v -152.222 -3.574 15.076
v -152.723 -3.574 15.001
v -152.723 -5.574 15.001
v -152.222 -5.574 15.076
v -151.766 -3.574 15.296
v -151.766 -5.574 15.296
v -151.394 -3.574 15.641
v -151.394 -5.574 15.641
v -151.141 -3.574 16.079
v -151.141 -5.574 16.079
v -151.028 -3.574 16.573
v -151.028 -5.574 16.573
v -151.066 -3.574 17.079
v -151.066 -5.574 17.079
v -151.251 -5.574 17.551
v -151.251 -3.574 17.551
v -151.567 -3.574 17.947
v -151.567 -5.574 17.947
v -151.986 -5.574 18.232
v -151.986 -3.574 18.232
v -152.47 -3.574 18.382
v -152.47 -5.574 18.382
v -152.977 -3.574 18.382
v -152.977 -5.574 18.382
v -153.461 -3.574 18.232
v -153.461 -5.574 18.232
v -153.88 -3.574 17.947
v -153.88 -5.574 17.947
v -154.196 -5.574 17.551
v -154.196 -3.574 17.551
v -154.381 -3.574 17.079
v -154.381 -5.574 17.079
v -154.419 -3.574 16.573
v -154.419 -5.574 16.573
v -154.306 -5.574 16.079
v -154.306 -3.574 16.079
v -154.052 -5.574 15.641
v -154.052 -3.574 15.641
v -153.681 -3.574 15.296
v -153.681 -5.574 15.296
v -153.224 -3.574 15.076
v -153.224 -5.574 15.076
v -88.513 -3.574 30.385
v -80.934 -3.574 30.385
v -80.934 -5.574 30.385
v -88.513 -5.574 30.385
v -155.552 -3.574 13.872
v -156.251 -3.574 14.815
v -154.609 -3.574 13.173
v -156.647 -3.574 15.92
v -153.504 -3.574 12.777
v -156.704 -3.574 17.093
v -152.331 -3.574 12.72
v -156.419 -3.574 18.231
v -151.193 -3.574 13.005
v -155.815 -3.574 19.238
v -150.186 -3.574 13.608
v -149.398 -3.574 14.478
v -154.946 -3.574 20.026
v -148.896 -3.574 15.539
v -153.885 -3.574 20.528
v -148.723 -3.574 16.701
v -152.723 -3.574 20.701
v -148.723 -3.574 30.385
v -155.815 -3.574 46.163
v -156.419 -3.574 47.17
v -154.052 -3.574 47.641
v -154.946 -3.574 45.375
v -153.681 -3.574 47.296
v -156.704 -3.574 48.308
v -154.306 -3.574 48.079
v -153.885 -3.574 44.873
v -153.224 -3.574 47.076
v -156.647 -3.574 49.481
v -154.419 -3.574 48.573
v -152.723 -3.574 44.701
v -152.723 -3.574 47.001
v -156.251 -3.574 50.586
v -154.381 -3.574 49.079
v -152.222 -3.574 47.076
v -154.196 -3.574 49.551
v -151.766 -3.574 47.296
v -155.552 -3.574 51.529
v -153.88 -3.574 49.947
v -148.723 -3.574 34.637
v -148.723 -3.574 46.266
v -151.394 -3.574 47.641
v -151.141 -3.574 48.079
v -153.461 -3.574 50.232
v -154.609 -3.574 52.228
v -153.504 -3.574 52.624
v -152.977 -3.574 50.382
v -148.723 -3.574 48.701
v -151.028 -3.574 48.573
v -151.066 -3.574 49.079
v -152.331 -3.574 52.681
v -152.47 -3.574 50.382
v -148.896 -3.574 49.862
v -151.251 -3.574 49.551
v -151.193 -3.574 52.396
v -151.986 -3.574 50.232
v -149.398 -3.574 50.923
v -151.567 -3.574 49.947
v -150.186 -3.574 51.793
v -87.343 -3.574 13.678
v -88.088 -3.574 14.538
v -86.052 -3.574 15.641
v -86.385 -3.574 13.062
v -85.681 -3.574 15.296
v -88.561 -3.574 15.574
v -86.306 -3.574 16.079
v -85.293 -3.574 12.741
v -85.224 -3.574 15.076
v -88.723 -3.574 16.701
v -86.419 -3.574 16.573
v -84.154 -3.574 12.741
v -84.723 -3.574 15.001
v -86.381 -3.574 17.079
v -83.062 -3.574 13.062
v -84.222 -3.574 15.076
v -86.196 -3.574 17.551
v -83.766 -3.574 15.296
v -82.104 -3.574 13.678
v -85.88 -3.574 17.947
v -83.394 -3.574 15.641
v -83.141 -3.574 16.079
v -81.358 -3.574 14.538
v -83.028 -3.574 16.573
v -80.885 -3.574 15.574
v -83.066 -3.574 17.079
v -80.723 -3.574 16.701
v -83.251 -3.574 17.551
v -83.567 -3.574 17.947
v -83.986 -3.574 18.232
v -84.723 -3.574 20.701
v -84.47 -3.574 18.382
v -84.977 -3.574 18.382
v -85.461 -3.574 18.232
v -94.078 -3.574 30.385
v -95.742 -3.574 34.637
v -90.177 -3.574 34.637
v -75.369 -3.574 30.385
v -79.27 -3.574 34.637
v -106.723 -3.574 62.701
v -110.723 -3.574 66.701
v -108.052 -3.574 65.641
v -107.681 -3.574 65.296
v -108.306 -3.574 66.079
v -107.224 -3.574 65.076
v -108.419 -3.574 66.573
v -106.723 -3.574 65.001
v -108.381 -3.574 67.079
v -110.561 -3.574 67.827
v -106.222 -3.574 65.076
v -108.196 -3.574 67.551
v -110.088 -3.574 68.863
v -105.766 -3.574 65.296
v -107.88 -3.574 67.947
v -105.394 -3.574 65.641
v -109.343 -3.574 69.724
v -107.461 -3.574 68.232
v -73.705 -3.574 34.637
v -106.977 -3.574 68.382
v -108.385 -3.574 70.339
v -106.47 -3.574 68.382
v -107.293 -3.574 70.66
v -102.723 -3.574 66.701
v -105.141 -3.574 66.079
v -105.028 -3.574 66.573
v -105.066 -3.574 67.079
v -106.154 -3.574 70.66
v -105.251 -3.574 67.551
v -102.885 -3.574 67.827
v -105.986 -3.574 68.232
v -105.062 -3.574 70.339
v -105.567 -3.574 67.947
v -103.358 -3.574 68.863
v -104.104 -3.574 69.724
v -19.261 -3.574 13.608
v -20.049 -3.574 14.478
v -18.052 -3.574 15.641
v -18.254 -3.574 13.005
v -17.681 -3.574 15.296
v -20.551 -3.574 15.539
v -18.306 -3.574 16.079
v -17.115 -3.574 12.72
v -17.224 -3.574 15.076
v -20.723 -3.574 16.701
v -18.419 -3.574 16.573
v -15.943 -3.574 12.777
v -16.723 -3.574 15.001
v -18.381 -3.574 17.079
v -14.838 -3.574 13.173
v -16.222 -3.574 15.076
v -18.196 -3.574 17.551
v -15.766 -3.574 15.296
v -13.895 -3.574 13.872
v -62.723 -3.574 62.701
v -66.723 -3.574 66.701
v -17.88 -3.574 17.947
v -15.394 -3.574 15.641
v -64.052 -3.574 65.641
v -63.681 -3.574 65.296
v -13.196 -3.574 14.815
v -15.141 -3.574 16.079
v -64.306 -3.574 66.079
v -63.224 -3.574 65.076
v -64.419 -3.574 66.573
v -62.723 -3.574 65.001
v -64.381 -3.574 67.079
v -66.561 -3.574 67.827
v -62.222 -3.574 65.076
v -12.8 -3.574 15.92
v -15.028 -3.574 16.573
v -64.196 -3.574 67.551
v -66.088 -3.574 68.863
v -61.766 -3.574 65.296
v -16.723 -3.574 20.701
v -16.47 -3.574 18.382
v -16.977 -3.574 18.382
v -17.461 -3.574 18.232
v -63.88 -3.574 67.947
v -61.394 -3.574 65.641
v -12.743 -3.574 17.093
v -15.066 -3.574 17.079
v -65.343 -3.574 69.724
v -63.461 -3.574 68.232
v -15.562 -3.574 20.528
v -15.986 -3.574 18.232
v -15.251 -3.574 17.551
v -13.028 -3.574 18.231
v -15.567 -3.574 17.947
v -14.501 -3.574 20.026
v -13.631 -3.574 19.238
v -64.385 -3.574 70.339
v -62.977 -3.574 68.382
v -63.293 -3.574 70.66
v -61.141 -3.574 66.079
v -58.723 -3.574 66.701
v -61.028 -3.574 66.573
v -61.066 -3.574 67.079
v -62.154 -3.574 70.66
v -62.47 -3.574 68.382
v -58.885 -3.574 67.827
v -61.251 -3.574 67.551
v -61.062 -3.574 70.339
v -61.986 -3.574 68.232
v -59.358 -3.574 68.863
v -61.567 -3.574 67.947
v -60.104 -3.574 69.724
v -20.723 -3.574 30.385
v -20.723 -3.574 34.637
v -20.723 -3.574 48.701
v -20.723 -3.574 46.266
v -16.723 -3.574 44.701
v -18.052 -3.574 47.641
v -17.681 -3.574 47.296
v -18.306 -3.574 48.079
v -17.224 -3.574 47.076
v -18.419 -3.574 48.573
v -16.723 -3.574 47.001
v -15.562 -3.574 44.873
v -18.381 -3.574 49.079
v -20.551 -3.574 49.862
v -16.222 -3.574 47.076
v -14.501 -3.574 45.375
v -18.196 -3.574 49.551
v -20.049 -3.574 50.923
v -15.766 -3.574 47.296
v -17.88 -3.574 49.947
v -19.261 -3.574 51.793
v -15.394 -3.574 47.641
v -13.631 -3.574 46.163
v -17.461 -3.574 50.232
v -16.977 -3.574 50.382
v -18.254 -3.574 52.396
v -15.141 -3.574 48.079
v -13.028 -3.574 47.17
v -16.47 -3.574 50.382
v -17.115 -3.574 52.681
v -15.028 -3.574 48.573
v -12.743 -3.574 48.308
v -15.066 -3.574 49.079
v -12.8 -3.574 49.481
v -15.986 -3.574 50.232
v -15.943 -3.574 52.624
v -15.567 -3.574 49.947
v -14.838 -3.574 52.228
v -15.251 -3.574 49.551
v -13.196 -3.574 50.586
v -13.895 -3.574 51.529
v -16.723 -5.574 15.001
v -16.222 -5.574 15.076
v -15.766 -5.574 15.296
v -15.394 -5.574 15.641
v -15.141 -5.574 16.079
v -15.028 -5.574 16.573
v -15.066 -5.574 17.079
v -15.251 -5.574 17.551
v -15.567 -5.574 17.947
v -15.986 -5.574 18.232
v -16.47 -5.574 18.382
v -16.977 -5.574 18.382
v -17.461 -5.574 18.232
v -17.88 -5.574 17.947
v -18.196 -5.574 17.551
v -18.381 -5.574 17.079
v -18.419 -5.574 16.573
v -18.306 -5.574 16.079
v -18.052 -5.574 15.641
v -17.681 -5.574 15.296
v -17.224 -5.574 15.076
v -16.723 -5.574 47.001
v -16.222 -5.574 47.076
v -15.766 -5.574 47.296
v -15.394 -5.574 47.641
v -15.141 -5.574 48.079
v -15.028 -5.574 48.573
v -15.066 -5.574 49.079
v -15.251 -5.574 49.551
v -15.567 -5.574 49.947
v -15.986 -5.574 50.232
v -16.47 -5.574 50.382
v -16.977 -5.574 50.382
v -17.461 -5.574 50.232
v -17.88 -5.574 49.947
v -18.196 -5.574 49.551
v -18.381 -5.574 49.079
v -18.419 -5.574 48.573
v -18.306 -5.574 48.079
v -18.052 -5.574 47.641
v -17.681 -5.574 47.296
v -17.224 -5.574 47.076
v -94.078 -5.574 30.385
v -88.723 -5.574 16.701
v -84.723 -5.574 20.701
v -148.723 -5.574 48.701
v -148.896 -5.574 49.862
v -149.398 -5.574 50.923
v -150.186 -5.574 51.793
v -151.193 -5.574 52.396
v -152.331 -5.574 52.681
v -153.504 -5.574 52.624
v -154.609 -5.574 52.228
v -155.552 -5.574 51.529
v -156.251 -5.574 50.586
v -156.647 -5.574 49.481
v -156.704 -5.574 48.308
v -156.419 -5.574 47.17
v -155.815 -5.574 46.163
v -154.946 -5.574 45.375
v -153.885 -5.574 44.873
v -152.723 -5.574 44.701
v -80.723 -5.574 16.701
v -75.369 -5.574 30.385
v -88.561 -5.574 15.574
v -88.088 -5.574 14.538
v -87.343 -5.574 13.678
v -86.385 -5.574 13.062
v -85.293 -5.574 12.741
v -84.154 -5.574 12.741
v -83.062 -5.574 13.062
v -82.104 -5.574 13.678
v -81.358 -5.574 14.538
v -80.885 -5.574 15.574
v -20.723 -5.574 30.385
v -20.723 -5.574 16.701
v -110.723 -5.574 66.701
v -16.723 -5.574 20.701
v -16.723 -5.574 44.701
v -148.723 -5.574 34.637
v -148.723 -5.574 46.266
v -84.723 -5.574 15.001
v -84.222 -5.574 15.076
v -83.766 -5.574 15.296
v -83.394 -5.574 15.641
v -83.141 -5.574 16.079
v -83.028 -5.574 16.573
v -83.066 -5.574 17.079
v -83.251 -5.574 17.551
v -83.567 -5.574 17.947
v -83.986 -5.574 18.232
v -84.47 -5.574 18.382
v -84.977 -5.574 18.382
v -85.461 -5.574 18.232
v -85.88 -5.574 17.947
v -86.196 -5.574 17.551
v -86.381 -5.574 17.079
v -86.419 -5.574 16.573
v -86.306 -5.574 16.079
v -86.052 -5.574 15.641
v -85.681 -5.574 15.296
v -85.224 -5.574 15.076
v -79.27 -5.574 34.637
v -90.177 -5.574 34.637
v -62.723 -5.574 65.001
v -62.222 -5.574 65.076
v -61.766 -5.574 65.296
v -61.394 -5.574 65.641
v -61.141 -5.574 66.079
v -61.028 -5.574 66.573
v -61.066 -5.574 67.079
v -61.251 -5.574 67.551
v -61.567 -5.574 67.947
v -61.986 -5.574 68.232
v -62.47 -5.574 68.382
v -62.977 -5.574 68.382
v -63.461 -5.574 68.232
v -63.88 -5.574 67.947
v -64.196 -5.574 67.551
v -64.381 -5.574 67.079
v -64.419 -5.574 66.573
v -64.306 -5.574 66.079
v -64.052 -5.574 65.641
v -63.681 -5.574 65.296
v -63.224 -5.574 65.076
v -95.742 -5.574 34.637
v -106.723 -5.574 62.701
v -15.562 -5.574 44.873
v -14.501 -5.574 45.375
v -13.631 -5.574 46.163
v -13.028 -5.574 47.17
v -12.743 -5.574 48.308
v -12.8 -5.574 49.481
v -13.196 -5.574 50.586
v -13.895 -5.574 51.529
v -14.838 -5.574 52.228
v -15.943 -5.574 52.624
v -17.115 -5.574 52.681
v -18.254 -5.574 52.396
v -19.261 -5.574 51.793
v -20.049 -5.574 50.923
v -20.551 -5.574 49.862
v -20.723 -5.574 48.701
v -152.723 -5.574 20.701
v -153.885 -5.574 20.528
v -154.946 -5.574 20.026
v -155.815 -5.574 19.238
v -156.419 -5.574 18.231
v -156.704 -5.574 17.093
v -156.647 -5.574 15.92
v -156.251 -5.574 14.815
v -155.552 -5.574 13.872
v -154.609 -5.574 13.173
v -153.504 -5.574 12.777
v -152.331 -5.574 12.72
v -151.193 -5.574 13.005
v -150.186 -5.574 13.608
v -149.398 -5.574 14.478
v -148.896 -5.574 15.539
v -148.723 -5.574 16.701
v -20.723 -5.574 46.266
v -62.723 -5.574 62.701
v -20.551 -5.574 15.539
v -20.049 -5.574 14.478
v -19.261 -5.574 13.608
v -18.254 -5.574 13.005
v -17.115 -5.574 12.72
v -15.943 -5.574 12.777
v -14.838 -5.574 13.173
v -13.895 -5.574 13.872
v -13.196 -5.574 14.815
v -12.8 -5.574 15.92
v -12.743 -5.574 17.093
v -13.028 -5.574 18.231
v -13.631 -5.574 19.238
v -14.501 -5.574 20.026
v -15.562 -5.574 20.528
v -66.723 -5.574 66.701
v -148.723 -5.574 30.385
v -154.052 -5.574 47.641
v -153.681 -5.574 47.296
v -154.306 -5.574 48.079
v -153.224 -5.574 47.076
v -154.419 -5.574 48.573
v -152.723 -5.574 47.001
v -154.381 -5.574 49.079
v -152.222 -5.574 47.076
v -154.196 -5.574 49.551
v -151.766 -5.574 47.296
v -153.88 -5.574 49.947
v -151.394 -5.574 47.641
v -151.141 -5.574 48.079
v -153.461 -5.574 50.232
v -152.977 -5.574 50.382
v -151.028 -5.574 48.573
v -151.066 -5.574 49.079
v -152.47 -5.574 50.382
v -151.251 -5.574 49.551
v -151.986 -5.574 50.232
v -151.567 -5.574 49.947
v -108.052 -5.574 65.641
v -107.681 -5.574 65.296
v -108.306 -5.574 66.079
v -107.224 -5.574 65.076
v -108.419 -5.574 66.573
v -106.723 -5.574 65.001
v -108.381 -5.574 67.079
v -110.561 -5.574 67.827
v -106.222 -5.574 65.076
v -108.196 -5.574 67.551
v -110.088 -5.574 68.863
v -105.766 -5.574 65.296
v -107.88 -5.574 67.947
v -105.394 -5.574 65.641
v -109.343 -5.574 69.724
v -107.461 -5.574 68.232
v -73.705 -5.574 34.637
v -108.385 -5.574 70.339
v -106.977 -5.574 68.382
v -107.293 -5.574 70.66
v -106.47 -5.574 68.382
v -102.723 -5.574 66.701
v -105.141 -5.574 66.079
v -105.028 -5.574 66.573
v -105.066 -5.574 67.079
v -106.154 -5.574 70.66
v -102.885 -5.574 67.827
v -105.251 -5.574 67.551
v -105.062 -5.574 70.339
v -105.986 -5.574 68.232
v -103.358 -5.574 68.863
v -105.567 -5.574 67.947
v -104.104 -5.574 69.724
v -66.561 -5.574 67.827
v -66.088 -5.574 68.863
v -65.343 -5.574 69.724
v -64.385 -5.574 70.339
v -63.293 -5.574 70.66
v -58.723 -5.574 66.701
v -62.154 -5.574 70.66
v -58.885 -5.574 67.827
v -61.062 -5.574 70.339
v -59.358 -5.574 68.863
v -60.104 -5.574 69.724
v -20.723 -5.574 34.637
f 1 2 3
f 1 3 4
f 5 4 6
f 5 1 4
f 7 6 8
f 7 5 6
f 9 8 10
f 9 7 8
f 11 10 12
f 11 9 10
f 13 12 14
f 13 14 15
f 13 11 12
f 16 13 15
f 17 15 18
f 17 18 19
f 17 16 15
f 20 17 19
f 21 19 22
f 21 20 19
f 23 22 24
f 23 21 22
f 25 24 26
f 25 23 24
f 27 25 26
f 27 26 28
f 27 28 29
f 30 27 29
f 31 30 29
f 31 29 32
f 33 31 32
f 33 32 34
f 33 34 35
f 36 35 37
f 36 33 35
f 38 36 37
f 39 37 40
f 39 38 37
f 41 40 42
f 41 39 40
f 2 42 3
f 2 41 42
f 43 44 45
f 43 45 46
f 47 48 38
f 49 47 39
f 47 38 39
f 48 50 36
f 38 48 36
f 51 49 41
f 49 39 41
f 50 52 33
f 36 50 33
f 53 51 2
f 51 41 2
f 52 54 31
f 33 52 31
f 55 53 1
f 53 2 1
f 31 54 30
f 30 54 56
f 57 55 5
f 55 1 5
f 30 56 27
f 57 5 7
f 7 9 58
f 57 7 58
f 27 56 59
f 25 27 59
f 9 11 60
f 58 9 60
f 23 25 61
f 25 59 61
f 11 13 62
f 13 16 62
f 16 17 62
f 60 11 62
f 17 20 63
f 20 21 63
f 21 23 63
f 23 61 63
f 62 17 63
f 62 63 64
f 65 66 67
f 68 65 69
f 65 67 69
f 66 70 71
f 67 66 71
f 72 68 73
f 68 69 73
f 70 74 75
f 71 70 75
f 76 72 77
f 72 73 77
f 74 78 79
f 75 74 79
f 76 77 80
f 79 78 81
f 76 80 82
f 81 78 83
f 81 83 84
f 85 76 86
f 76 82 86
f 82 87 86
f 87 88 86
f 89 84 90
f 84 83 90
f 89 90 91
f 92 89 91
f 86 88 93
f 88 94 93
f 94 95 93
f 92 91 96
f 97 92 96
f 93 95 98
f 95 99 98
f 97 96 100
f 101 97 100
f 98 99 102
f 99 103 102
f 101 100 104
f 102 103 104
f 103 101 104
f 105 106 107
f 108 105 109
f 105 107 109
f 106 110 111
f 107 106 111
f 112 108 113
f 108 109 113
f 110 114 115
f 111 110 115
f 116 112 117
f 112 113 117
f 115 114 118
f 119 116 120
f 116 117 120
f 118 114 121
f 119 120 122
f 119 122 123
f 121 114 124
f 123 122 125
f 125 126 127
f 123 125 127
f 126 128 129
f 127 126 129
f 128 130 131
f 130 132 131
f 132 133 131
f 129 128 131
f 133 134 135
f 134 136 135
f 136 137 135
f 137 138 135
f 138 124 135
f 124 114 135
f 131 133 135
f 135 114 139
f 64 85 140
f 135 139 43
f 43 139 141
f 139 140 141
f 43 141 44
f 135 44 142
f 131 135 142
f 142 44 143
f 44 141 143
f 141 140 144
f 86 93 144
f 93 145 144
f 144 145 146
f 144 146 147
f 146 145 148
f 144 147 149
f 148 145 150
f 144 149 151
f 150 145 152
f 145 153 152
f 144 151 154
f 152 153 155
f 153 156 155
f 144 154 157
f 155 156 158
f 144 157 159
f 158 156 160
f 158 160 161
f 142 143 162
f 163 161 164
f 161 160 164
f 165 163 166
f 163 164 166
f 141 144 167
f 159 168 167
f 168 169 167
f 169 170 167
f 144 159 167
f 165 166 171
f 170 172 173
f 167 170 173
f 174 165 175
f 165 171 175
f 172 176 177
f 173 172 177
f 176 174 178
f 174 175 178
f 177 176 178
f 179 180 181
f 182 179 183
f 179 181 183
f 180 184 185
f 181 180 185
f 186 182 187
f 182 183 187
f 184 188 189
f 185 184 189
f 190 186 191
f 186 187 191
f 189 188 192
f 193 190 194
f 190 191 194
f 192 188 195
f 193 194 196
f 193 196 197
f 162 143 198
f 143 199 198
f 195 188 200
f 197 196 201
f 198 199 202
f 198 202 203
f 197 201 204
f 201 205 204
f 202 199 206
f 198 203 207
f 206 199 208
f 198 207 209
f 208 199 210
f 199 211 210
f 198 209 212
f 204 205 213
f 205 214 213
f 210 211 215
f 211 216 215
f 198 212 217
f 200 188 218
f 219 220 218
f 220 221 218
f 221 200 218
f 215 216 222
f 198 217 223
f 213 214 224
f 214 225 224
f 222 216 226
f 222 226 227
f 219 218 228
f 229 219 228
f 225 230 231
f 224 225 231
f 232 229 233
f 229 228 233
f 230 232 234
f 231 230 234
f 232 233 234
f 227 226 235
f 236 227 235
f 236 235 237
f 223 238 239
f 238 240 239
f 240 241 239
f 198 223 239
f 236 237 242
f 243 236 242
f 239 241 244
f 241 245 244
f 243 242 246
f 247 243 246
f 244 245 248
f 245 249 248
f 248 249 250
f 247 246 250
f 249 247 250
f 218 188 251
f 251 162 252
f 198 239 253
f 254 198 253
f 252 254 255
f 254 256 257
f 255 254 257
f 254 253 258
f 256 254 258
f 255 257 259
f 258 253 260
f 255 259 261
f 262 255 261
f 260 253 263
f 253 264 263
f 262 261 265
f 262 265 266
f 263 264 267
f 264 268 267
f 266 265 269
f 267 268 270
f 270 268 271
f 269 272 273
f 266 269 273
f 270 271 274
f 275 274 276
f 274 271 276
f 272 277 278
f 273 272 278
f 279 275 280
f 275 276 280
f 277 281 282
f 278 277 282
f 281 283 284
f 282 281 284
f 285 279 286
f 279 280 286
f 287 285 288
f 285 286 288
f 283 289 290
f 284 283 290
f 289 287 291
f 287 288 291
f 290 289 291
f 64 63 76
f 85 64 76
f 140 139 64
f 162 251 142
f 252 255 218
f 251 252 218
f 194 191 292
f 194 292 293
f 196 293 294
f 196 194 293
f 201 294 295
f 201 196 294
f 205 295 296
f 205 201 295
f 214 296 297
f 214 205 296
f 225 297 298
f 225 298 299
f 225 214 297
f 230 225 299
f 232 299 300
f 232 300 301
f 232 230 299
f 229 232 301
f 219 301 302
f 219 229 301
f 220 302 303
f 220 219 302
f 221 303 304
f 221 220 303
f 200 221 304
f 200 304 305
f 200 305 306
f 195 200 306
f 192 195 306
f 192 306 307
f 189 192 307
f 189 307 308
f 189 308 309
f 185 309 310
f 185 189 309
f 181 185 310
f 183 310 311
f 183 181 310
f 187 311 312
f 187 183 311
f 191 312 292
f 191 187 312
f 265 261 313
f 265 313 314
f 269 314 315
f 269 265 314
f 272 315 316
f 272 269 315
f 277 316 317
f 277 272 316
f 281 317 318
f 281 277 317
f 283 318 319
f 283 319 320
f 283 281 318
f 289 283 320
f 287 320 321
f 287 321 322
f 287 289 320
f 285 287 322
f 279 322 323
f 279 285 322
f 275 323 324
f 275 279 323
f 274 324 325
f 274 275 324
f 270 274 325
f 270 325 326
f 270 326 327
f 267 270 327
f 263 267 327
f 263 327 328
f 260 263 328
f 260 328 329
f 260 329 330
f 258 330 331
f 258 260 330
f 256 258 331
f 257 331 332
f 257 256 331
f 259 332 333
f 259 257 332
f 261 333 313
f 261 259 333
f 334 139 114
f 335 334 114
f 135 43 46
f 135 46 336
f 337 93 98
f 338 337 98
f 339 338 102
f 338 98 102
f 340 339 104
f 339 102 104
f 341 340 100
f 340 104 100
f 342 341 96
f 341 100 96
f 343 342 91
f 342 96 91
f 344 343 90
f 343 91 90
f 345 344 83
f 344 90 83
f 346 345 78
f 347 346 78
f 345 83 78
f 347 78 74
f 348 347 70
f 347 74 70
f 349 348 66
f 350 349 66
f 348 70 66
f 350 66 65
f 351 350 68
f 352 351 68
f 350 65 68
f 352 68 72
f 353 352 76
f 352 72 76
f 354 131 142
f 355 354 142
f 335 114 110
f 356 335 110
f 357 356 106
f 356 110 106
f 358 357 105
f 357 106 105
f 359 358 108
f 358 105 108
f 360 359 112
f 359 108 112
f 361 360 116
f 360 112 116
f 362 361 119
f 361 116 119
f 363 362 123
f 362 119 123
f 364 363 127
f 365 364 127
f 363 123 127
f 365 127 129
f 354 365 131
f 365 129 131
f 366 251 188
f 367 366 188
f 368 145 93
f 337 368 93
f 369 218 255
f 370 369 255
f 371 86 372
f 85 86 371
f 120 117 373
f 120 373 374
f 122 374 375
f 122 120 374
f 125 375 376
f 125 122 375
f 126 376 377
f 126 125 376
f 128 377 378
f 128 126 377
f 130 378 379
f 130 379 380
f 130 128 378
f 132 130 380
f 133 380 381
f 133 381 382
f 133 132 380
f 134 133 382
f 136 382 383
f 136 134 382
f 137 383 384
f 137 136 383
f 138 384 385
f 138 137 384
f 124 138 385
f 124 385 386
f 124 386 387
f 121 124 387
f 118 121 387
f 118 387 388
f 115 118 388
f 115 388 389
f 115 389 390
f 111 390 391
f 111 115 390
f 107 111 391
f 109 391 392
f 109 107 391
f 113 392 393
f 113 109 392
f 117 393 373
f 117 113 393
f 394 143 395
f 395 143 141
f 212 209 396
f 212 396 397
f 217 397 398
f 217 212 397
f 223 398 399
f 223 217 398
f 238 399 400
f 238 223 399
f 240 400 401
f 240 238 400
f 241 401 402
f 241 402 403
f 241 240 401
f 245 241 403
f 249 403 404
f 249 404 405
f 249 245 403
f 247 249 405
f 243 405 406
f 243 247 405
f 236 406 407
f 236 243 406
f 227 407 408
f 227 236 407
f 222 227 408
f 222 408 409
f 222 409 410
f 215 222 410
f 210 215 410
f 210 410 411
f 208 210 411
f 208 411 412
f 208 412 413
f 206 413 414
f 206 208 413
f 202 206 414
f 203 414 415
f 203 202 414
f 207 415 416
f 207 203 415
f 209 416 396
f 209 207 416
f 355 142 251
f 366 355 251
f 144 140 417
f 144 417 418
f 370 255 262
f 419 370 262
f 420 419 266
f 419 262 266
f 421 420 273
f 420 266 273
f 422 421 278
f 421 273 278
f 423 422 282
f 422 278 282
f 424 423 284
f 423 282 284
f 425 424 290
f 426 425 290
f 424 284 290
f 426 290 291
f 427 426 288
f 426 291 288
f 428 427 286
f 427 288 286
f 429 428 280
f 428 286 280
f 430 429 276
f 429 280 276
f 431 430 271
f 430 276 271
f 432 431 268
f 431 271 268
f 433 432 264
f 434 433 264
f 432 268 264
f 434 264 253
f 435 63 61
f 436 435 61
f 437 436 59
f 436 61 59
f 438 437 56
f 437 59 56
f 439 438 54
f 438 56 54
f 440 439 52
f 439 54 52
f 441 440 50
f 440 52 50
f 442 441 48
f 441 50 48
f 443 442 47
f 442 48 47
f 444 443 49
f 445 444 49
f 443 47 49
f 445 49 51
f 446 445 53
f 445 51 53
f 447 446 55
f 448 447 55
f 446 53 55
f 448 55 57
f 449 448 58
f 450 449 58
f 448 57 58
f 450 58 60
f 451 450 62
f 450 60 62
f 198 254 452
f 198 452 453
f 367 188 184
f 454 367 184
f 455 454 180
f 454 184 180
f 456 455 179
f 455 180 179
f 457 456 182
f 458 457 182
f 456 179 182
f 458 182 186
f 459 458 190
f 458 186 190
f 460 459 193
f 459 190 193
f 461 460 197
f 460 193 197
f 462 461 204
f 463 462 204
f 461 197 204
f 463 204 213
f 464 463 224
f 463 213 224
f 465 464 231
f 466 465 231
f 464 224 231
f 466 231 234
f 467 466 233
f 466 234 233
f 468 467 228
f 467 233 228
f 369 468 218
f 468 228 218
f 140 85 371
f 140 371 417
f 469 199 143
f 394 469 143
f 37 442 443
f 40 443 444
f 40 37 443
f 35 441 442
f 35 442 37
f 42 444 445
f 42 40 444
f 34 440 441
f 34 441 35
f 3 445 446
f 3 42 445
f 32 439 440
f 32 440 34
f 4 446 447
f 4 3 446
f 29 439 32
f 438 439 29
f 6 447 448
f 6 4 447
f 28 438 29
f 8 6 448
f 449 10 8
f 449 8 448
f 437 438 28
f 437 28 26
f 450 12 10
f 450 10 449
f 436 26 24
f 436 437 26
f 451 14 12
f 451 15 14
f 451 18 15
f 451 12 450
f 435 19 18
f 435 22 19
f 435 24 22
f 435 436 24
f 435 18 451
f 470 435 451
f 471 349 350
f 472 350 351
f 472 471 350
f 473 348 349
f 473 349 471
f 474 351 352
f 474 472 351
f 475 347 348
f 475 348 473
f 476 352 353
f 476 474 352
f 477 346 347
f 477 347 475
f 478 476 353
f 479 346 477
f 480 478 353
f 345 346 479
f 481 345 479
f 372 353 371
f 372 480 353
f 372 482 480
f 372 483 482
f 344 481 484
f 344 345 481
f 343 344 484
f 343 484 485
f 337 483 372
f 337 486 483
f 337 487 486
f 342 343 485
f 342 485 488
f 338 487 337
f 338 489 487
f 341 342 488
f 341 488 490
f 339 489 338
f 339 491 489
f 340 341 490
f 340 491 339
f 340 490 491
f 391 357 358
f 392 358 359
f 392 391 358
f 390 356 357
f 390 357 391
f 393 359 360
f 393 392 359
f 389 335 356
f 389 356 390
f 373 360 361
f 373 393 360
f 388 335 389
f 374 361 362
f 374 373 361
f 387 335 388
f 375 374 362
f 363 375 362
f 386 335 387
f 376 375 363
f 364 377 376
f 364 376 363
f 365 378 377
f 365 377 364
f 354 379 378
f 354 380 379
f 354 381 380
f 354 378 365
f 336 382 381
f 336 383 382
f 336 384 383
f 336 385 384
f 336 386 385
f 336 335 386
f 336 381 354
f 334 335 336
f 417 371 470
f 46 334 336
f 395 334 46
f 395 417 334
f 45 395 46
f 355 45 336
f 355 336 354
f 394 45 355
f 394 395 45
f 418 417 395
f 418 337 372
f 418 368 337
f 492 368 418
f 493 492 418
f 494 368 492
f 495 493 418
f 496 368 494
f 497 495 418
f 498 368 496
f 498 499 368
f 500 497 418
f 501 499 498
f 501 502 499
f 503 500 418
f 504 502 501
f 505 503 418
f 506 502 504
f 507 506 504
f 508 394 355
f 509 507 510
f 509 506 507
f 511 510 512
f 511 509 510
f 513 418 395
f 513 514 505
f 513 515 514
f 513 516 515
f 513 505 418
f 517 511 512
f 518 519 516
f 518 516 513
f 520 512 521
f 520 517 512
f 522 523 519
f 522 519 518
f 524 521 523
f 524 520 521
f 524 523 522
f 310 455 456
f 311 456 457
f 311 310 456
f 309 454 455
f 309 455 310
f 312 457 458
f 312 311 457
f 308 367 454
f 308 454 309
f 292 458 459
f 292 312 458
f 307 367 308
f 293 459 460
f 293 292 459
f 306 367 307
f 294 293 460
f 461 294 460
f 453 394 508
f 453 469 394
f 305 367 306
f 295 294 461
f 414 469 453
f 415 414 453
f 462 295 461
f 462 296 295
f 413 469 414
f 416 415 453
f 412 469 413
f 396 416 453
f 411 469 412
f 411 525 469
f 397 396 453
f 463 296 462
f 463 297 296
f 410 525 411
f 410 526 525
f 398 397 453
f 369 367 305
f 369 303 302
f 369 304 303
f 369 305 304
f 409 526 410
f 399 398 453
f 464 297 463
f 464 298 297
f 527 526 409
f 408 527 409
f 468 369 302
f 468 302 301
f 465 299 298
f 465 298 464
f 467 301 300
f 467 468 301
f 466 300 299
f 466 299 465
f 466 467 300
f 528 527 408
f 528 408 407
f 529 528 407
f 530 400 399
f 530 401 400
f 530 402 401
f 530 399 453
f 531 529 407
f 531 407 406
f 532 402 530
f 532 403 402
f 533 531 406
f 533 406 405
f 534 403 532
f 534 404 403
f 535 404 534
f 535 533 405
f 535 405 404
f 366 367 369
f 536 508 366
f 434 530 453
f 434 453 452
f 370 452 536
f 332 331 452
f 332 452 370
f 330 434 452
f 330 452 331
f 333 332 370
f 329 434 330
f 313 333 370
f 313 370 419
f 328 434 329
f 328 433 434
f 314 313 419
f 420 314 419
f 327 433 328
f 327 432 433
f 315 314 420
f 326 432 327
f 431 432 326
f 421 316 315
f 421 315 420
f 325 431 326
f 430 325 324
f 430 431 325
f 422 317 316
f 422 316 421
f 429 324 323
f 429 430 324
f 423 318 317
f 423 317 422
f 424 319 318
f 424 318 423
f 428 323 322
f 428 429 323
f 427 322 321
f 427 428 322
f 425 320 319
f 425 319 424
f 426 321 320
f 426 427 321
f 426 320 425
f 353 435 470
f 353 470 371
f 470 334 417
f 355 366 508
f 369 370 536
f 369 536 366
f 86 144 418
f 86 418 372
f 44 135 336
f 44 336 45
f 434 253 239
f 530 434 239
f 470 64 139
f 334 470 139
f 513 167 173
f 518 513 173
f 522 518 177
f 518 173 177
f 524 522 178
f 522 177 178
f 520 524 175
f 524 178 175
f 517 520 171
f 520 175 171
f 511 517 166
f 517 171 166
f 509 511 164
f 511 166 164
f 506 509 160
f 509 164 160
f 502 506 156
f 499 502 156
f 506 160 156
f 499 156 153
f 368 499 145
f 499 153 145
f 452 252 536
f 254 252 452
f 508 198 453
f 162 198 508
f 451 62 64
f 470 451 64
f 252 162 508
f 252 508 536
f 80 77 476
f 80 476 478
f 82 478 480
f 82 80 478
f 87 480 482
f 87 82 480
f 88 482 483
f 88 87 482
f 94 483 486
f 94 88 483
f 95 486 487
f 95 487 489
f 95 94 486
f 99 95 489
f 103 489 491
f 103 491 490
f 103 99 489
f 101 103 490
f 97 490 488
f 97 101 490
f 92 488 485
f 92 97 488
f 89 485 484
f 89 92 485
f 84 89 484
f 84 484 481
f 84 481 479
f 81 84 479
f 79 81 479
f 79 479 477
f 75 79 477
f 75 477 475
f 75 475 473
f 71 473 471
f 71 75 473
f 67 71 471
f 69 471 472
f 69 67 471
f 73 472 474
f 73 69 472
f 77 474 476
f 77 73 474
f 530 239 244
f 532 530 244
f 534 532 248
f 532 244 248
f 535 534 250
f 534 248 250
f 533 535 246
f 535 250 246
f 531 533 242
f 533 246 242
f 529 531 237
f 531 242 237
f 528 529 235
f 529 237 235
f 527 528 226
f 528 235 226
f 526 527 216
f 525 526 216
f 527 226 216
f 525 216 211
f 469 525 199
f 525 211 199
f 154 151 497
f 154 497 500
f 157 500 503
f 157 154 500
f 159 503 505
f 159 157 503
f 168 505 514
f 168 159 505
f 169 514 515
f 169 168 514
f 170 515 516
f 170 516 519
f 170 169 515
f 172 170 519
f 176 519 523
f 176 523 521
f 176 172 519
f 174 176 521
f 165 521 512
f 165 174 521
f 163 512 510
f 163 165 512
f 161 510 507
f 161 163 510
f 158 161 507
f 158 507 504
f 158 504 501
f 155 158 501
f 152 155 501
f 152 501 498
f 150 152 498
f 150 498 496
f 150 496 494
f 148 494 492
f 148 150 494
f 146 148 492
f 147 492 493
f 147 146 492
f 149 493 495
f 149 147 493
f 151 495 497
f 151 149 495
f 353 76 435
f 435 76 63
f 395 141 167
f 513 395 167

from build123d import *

# Parameters (mm, degrees)
SKETCH1_R           = 1.7
BOSS_EXTRUDE2_DEPTH = 2


with BuildPart() as part:
    # Sketch1 → Boss-Extrude2 (new body)
    with BuildSketch(Plane.XZ.offset(3.574146791)):
        with BuildLine():
            Line((-152.723385358, 44.700516394), (-152.723385358, 20.700516394))
            ThreePointArc((-152.723385358, 20.700516394), (-155.551812483, 13.872089269), (-148.723385358, 16.700516394))
            Line((-148.723385358, 16.700516394), (-148.723385358, 30.384571347))
            Line((-148.723385358, 30.384571347), (-94.078015557, 30.384571347))
            Line((-94.078015557, 30.384571347), (-88.723385358, 16.700516394))
            ThreePointArc((-88.723385358, 16.700516394), (-84.723385358, 12.700516394), (-80.723385358, 16.700516394))
            Line((-80.723385358, 16.700516394), (-75.368755159, 30.384571347))
            Line((-75.368755159, 30.384571347), (-20.723385358, 30.384571347))
            Line((-20.723385358, 30.384571347), (-20.723385358, 16.700516394))
            ThreePointArc((-20.723385358, 16.700516394), (-13.894958233, 13.872089269), (-16.723385358, 20.700516394))
            Line((-16.723385358, 20.700516394), (-16.723385358, 44.700516394))
            ThreePointArc((-16.723385358, 44.700516394), (-13.894958233, 51.528943519), (-20.723385358, 48.700516394))
            Line((-20.723385358, 48.700516394), (-58.723385358, 66.700516394))
            ThreePointArc((-58.723385358, 66.700516394), (-62.723385358, 70.700516394), (-66.723385358, 66.700516394))
            Line((-66.723385358, 66.700516394), (-79.270108033, 34.636669558))
            Line((-79.270108033, 34.636669558), (-90.176662683, 34.636669558))
            Line((-90.176662683, 34.636669558), (-102.723385358, 66.700516394))
            ThreePointArc((-102.723385358, 66.700516394), (-106.723385358, 70.700516394), (-110.723385358, 66.700516394))
            Line((-110.723385358, 66.700516394), (-148.723385358, 48.700516394))
            ThreePointArc((-148.723385358, 48.700516394), (-155.551812483, 51.528943519), (-152.723385358, 44.700516394))
        make_face()
        with Locations(Location((-152.723385358, 48.700516394, 0), (0, 0, 270))):
            Circle(SKETCH1_R, mode=Mode.SUBTRACT)
        with Locations(Location((-106.723385358, 66.700516394, 0), (0, 0, 270))):
            Circle(SKETCH1_R, mode=Mode.SUBTRACT)
        with Locations(Location((-62.723385358, 66.700516394, 0), (0, 0, 270))):
            Circle(SKETCH1_R, mode=Mode.SUBTRACT)
        with Locations(Location((-16.723385358, 48.700516394, 0), (0, 0, 270))):
            Circle(SKETCH1_R, mode=Mode.SUBTRACT)
        with Locations(Location((-152.723385358, 16.700516394, 0), (0, 0, 270))):
            Circle(SKETCH1_R, mode=Mode.SUBTRACT)
        with Locations(Location((-84.723385358, 16.700516394, 0), (0, 0, 270))):
            Circle(SKETCH1_R, mode=Mode.SUBTRACT)
        with Locations(Location((-16.723385358, 16.700516394, 0), (0, 0, 270))):
            Circle(SKETCH1_R, mode=Mode.SUBTRACT)
        Polygon((-148.723385358, 46.265733785), (-148.723385358, 34.636669558), (-95.741880075, 34.636669558), (-106.723385358, 62.700516394), align=None, mode=Mode.SUBTRACT)
        Polygon((-84.723385358, 20.700516394), (-80.933972551, 30.384571347), (-88.512798166, 30.384571347), align=None, mode=Mode.SUBTRACT)
        Polygon((-62.723385358, 62.700516394), (-73.704890642, 34.636669558), (-20.723385358, 34.636669558), (-20.723385358, 46.265733785), align=None, mode=Mode.SUBTRACT)
    extrude(amount=BOSS_EXTRUDE2_DEPTH)


solid = part.part
